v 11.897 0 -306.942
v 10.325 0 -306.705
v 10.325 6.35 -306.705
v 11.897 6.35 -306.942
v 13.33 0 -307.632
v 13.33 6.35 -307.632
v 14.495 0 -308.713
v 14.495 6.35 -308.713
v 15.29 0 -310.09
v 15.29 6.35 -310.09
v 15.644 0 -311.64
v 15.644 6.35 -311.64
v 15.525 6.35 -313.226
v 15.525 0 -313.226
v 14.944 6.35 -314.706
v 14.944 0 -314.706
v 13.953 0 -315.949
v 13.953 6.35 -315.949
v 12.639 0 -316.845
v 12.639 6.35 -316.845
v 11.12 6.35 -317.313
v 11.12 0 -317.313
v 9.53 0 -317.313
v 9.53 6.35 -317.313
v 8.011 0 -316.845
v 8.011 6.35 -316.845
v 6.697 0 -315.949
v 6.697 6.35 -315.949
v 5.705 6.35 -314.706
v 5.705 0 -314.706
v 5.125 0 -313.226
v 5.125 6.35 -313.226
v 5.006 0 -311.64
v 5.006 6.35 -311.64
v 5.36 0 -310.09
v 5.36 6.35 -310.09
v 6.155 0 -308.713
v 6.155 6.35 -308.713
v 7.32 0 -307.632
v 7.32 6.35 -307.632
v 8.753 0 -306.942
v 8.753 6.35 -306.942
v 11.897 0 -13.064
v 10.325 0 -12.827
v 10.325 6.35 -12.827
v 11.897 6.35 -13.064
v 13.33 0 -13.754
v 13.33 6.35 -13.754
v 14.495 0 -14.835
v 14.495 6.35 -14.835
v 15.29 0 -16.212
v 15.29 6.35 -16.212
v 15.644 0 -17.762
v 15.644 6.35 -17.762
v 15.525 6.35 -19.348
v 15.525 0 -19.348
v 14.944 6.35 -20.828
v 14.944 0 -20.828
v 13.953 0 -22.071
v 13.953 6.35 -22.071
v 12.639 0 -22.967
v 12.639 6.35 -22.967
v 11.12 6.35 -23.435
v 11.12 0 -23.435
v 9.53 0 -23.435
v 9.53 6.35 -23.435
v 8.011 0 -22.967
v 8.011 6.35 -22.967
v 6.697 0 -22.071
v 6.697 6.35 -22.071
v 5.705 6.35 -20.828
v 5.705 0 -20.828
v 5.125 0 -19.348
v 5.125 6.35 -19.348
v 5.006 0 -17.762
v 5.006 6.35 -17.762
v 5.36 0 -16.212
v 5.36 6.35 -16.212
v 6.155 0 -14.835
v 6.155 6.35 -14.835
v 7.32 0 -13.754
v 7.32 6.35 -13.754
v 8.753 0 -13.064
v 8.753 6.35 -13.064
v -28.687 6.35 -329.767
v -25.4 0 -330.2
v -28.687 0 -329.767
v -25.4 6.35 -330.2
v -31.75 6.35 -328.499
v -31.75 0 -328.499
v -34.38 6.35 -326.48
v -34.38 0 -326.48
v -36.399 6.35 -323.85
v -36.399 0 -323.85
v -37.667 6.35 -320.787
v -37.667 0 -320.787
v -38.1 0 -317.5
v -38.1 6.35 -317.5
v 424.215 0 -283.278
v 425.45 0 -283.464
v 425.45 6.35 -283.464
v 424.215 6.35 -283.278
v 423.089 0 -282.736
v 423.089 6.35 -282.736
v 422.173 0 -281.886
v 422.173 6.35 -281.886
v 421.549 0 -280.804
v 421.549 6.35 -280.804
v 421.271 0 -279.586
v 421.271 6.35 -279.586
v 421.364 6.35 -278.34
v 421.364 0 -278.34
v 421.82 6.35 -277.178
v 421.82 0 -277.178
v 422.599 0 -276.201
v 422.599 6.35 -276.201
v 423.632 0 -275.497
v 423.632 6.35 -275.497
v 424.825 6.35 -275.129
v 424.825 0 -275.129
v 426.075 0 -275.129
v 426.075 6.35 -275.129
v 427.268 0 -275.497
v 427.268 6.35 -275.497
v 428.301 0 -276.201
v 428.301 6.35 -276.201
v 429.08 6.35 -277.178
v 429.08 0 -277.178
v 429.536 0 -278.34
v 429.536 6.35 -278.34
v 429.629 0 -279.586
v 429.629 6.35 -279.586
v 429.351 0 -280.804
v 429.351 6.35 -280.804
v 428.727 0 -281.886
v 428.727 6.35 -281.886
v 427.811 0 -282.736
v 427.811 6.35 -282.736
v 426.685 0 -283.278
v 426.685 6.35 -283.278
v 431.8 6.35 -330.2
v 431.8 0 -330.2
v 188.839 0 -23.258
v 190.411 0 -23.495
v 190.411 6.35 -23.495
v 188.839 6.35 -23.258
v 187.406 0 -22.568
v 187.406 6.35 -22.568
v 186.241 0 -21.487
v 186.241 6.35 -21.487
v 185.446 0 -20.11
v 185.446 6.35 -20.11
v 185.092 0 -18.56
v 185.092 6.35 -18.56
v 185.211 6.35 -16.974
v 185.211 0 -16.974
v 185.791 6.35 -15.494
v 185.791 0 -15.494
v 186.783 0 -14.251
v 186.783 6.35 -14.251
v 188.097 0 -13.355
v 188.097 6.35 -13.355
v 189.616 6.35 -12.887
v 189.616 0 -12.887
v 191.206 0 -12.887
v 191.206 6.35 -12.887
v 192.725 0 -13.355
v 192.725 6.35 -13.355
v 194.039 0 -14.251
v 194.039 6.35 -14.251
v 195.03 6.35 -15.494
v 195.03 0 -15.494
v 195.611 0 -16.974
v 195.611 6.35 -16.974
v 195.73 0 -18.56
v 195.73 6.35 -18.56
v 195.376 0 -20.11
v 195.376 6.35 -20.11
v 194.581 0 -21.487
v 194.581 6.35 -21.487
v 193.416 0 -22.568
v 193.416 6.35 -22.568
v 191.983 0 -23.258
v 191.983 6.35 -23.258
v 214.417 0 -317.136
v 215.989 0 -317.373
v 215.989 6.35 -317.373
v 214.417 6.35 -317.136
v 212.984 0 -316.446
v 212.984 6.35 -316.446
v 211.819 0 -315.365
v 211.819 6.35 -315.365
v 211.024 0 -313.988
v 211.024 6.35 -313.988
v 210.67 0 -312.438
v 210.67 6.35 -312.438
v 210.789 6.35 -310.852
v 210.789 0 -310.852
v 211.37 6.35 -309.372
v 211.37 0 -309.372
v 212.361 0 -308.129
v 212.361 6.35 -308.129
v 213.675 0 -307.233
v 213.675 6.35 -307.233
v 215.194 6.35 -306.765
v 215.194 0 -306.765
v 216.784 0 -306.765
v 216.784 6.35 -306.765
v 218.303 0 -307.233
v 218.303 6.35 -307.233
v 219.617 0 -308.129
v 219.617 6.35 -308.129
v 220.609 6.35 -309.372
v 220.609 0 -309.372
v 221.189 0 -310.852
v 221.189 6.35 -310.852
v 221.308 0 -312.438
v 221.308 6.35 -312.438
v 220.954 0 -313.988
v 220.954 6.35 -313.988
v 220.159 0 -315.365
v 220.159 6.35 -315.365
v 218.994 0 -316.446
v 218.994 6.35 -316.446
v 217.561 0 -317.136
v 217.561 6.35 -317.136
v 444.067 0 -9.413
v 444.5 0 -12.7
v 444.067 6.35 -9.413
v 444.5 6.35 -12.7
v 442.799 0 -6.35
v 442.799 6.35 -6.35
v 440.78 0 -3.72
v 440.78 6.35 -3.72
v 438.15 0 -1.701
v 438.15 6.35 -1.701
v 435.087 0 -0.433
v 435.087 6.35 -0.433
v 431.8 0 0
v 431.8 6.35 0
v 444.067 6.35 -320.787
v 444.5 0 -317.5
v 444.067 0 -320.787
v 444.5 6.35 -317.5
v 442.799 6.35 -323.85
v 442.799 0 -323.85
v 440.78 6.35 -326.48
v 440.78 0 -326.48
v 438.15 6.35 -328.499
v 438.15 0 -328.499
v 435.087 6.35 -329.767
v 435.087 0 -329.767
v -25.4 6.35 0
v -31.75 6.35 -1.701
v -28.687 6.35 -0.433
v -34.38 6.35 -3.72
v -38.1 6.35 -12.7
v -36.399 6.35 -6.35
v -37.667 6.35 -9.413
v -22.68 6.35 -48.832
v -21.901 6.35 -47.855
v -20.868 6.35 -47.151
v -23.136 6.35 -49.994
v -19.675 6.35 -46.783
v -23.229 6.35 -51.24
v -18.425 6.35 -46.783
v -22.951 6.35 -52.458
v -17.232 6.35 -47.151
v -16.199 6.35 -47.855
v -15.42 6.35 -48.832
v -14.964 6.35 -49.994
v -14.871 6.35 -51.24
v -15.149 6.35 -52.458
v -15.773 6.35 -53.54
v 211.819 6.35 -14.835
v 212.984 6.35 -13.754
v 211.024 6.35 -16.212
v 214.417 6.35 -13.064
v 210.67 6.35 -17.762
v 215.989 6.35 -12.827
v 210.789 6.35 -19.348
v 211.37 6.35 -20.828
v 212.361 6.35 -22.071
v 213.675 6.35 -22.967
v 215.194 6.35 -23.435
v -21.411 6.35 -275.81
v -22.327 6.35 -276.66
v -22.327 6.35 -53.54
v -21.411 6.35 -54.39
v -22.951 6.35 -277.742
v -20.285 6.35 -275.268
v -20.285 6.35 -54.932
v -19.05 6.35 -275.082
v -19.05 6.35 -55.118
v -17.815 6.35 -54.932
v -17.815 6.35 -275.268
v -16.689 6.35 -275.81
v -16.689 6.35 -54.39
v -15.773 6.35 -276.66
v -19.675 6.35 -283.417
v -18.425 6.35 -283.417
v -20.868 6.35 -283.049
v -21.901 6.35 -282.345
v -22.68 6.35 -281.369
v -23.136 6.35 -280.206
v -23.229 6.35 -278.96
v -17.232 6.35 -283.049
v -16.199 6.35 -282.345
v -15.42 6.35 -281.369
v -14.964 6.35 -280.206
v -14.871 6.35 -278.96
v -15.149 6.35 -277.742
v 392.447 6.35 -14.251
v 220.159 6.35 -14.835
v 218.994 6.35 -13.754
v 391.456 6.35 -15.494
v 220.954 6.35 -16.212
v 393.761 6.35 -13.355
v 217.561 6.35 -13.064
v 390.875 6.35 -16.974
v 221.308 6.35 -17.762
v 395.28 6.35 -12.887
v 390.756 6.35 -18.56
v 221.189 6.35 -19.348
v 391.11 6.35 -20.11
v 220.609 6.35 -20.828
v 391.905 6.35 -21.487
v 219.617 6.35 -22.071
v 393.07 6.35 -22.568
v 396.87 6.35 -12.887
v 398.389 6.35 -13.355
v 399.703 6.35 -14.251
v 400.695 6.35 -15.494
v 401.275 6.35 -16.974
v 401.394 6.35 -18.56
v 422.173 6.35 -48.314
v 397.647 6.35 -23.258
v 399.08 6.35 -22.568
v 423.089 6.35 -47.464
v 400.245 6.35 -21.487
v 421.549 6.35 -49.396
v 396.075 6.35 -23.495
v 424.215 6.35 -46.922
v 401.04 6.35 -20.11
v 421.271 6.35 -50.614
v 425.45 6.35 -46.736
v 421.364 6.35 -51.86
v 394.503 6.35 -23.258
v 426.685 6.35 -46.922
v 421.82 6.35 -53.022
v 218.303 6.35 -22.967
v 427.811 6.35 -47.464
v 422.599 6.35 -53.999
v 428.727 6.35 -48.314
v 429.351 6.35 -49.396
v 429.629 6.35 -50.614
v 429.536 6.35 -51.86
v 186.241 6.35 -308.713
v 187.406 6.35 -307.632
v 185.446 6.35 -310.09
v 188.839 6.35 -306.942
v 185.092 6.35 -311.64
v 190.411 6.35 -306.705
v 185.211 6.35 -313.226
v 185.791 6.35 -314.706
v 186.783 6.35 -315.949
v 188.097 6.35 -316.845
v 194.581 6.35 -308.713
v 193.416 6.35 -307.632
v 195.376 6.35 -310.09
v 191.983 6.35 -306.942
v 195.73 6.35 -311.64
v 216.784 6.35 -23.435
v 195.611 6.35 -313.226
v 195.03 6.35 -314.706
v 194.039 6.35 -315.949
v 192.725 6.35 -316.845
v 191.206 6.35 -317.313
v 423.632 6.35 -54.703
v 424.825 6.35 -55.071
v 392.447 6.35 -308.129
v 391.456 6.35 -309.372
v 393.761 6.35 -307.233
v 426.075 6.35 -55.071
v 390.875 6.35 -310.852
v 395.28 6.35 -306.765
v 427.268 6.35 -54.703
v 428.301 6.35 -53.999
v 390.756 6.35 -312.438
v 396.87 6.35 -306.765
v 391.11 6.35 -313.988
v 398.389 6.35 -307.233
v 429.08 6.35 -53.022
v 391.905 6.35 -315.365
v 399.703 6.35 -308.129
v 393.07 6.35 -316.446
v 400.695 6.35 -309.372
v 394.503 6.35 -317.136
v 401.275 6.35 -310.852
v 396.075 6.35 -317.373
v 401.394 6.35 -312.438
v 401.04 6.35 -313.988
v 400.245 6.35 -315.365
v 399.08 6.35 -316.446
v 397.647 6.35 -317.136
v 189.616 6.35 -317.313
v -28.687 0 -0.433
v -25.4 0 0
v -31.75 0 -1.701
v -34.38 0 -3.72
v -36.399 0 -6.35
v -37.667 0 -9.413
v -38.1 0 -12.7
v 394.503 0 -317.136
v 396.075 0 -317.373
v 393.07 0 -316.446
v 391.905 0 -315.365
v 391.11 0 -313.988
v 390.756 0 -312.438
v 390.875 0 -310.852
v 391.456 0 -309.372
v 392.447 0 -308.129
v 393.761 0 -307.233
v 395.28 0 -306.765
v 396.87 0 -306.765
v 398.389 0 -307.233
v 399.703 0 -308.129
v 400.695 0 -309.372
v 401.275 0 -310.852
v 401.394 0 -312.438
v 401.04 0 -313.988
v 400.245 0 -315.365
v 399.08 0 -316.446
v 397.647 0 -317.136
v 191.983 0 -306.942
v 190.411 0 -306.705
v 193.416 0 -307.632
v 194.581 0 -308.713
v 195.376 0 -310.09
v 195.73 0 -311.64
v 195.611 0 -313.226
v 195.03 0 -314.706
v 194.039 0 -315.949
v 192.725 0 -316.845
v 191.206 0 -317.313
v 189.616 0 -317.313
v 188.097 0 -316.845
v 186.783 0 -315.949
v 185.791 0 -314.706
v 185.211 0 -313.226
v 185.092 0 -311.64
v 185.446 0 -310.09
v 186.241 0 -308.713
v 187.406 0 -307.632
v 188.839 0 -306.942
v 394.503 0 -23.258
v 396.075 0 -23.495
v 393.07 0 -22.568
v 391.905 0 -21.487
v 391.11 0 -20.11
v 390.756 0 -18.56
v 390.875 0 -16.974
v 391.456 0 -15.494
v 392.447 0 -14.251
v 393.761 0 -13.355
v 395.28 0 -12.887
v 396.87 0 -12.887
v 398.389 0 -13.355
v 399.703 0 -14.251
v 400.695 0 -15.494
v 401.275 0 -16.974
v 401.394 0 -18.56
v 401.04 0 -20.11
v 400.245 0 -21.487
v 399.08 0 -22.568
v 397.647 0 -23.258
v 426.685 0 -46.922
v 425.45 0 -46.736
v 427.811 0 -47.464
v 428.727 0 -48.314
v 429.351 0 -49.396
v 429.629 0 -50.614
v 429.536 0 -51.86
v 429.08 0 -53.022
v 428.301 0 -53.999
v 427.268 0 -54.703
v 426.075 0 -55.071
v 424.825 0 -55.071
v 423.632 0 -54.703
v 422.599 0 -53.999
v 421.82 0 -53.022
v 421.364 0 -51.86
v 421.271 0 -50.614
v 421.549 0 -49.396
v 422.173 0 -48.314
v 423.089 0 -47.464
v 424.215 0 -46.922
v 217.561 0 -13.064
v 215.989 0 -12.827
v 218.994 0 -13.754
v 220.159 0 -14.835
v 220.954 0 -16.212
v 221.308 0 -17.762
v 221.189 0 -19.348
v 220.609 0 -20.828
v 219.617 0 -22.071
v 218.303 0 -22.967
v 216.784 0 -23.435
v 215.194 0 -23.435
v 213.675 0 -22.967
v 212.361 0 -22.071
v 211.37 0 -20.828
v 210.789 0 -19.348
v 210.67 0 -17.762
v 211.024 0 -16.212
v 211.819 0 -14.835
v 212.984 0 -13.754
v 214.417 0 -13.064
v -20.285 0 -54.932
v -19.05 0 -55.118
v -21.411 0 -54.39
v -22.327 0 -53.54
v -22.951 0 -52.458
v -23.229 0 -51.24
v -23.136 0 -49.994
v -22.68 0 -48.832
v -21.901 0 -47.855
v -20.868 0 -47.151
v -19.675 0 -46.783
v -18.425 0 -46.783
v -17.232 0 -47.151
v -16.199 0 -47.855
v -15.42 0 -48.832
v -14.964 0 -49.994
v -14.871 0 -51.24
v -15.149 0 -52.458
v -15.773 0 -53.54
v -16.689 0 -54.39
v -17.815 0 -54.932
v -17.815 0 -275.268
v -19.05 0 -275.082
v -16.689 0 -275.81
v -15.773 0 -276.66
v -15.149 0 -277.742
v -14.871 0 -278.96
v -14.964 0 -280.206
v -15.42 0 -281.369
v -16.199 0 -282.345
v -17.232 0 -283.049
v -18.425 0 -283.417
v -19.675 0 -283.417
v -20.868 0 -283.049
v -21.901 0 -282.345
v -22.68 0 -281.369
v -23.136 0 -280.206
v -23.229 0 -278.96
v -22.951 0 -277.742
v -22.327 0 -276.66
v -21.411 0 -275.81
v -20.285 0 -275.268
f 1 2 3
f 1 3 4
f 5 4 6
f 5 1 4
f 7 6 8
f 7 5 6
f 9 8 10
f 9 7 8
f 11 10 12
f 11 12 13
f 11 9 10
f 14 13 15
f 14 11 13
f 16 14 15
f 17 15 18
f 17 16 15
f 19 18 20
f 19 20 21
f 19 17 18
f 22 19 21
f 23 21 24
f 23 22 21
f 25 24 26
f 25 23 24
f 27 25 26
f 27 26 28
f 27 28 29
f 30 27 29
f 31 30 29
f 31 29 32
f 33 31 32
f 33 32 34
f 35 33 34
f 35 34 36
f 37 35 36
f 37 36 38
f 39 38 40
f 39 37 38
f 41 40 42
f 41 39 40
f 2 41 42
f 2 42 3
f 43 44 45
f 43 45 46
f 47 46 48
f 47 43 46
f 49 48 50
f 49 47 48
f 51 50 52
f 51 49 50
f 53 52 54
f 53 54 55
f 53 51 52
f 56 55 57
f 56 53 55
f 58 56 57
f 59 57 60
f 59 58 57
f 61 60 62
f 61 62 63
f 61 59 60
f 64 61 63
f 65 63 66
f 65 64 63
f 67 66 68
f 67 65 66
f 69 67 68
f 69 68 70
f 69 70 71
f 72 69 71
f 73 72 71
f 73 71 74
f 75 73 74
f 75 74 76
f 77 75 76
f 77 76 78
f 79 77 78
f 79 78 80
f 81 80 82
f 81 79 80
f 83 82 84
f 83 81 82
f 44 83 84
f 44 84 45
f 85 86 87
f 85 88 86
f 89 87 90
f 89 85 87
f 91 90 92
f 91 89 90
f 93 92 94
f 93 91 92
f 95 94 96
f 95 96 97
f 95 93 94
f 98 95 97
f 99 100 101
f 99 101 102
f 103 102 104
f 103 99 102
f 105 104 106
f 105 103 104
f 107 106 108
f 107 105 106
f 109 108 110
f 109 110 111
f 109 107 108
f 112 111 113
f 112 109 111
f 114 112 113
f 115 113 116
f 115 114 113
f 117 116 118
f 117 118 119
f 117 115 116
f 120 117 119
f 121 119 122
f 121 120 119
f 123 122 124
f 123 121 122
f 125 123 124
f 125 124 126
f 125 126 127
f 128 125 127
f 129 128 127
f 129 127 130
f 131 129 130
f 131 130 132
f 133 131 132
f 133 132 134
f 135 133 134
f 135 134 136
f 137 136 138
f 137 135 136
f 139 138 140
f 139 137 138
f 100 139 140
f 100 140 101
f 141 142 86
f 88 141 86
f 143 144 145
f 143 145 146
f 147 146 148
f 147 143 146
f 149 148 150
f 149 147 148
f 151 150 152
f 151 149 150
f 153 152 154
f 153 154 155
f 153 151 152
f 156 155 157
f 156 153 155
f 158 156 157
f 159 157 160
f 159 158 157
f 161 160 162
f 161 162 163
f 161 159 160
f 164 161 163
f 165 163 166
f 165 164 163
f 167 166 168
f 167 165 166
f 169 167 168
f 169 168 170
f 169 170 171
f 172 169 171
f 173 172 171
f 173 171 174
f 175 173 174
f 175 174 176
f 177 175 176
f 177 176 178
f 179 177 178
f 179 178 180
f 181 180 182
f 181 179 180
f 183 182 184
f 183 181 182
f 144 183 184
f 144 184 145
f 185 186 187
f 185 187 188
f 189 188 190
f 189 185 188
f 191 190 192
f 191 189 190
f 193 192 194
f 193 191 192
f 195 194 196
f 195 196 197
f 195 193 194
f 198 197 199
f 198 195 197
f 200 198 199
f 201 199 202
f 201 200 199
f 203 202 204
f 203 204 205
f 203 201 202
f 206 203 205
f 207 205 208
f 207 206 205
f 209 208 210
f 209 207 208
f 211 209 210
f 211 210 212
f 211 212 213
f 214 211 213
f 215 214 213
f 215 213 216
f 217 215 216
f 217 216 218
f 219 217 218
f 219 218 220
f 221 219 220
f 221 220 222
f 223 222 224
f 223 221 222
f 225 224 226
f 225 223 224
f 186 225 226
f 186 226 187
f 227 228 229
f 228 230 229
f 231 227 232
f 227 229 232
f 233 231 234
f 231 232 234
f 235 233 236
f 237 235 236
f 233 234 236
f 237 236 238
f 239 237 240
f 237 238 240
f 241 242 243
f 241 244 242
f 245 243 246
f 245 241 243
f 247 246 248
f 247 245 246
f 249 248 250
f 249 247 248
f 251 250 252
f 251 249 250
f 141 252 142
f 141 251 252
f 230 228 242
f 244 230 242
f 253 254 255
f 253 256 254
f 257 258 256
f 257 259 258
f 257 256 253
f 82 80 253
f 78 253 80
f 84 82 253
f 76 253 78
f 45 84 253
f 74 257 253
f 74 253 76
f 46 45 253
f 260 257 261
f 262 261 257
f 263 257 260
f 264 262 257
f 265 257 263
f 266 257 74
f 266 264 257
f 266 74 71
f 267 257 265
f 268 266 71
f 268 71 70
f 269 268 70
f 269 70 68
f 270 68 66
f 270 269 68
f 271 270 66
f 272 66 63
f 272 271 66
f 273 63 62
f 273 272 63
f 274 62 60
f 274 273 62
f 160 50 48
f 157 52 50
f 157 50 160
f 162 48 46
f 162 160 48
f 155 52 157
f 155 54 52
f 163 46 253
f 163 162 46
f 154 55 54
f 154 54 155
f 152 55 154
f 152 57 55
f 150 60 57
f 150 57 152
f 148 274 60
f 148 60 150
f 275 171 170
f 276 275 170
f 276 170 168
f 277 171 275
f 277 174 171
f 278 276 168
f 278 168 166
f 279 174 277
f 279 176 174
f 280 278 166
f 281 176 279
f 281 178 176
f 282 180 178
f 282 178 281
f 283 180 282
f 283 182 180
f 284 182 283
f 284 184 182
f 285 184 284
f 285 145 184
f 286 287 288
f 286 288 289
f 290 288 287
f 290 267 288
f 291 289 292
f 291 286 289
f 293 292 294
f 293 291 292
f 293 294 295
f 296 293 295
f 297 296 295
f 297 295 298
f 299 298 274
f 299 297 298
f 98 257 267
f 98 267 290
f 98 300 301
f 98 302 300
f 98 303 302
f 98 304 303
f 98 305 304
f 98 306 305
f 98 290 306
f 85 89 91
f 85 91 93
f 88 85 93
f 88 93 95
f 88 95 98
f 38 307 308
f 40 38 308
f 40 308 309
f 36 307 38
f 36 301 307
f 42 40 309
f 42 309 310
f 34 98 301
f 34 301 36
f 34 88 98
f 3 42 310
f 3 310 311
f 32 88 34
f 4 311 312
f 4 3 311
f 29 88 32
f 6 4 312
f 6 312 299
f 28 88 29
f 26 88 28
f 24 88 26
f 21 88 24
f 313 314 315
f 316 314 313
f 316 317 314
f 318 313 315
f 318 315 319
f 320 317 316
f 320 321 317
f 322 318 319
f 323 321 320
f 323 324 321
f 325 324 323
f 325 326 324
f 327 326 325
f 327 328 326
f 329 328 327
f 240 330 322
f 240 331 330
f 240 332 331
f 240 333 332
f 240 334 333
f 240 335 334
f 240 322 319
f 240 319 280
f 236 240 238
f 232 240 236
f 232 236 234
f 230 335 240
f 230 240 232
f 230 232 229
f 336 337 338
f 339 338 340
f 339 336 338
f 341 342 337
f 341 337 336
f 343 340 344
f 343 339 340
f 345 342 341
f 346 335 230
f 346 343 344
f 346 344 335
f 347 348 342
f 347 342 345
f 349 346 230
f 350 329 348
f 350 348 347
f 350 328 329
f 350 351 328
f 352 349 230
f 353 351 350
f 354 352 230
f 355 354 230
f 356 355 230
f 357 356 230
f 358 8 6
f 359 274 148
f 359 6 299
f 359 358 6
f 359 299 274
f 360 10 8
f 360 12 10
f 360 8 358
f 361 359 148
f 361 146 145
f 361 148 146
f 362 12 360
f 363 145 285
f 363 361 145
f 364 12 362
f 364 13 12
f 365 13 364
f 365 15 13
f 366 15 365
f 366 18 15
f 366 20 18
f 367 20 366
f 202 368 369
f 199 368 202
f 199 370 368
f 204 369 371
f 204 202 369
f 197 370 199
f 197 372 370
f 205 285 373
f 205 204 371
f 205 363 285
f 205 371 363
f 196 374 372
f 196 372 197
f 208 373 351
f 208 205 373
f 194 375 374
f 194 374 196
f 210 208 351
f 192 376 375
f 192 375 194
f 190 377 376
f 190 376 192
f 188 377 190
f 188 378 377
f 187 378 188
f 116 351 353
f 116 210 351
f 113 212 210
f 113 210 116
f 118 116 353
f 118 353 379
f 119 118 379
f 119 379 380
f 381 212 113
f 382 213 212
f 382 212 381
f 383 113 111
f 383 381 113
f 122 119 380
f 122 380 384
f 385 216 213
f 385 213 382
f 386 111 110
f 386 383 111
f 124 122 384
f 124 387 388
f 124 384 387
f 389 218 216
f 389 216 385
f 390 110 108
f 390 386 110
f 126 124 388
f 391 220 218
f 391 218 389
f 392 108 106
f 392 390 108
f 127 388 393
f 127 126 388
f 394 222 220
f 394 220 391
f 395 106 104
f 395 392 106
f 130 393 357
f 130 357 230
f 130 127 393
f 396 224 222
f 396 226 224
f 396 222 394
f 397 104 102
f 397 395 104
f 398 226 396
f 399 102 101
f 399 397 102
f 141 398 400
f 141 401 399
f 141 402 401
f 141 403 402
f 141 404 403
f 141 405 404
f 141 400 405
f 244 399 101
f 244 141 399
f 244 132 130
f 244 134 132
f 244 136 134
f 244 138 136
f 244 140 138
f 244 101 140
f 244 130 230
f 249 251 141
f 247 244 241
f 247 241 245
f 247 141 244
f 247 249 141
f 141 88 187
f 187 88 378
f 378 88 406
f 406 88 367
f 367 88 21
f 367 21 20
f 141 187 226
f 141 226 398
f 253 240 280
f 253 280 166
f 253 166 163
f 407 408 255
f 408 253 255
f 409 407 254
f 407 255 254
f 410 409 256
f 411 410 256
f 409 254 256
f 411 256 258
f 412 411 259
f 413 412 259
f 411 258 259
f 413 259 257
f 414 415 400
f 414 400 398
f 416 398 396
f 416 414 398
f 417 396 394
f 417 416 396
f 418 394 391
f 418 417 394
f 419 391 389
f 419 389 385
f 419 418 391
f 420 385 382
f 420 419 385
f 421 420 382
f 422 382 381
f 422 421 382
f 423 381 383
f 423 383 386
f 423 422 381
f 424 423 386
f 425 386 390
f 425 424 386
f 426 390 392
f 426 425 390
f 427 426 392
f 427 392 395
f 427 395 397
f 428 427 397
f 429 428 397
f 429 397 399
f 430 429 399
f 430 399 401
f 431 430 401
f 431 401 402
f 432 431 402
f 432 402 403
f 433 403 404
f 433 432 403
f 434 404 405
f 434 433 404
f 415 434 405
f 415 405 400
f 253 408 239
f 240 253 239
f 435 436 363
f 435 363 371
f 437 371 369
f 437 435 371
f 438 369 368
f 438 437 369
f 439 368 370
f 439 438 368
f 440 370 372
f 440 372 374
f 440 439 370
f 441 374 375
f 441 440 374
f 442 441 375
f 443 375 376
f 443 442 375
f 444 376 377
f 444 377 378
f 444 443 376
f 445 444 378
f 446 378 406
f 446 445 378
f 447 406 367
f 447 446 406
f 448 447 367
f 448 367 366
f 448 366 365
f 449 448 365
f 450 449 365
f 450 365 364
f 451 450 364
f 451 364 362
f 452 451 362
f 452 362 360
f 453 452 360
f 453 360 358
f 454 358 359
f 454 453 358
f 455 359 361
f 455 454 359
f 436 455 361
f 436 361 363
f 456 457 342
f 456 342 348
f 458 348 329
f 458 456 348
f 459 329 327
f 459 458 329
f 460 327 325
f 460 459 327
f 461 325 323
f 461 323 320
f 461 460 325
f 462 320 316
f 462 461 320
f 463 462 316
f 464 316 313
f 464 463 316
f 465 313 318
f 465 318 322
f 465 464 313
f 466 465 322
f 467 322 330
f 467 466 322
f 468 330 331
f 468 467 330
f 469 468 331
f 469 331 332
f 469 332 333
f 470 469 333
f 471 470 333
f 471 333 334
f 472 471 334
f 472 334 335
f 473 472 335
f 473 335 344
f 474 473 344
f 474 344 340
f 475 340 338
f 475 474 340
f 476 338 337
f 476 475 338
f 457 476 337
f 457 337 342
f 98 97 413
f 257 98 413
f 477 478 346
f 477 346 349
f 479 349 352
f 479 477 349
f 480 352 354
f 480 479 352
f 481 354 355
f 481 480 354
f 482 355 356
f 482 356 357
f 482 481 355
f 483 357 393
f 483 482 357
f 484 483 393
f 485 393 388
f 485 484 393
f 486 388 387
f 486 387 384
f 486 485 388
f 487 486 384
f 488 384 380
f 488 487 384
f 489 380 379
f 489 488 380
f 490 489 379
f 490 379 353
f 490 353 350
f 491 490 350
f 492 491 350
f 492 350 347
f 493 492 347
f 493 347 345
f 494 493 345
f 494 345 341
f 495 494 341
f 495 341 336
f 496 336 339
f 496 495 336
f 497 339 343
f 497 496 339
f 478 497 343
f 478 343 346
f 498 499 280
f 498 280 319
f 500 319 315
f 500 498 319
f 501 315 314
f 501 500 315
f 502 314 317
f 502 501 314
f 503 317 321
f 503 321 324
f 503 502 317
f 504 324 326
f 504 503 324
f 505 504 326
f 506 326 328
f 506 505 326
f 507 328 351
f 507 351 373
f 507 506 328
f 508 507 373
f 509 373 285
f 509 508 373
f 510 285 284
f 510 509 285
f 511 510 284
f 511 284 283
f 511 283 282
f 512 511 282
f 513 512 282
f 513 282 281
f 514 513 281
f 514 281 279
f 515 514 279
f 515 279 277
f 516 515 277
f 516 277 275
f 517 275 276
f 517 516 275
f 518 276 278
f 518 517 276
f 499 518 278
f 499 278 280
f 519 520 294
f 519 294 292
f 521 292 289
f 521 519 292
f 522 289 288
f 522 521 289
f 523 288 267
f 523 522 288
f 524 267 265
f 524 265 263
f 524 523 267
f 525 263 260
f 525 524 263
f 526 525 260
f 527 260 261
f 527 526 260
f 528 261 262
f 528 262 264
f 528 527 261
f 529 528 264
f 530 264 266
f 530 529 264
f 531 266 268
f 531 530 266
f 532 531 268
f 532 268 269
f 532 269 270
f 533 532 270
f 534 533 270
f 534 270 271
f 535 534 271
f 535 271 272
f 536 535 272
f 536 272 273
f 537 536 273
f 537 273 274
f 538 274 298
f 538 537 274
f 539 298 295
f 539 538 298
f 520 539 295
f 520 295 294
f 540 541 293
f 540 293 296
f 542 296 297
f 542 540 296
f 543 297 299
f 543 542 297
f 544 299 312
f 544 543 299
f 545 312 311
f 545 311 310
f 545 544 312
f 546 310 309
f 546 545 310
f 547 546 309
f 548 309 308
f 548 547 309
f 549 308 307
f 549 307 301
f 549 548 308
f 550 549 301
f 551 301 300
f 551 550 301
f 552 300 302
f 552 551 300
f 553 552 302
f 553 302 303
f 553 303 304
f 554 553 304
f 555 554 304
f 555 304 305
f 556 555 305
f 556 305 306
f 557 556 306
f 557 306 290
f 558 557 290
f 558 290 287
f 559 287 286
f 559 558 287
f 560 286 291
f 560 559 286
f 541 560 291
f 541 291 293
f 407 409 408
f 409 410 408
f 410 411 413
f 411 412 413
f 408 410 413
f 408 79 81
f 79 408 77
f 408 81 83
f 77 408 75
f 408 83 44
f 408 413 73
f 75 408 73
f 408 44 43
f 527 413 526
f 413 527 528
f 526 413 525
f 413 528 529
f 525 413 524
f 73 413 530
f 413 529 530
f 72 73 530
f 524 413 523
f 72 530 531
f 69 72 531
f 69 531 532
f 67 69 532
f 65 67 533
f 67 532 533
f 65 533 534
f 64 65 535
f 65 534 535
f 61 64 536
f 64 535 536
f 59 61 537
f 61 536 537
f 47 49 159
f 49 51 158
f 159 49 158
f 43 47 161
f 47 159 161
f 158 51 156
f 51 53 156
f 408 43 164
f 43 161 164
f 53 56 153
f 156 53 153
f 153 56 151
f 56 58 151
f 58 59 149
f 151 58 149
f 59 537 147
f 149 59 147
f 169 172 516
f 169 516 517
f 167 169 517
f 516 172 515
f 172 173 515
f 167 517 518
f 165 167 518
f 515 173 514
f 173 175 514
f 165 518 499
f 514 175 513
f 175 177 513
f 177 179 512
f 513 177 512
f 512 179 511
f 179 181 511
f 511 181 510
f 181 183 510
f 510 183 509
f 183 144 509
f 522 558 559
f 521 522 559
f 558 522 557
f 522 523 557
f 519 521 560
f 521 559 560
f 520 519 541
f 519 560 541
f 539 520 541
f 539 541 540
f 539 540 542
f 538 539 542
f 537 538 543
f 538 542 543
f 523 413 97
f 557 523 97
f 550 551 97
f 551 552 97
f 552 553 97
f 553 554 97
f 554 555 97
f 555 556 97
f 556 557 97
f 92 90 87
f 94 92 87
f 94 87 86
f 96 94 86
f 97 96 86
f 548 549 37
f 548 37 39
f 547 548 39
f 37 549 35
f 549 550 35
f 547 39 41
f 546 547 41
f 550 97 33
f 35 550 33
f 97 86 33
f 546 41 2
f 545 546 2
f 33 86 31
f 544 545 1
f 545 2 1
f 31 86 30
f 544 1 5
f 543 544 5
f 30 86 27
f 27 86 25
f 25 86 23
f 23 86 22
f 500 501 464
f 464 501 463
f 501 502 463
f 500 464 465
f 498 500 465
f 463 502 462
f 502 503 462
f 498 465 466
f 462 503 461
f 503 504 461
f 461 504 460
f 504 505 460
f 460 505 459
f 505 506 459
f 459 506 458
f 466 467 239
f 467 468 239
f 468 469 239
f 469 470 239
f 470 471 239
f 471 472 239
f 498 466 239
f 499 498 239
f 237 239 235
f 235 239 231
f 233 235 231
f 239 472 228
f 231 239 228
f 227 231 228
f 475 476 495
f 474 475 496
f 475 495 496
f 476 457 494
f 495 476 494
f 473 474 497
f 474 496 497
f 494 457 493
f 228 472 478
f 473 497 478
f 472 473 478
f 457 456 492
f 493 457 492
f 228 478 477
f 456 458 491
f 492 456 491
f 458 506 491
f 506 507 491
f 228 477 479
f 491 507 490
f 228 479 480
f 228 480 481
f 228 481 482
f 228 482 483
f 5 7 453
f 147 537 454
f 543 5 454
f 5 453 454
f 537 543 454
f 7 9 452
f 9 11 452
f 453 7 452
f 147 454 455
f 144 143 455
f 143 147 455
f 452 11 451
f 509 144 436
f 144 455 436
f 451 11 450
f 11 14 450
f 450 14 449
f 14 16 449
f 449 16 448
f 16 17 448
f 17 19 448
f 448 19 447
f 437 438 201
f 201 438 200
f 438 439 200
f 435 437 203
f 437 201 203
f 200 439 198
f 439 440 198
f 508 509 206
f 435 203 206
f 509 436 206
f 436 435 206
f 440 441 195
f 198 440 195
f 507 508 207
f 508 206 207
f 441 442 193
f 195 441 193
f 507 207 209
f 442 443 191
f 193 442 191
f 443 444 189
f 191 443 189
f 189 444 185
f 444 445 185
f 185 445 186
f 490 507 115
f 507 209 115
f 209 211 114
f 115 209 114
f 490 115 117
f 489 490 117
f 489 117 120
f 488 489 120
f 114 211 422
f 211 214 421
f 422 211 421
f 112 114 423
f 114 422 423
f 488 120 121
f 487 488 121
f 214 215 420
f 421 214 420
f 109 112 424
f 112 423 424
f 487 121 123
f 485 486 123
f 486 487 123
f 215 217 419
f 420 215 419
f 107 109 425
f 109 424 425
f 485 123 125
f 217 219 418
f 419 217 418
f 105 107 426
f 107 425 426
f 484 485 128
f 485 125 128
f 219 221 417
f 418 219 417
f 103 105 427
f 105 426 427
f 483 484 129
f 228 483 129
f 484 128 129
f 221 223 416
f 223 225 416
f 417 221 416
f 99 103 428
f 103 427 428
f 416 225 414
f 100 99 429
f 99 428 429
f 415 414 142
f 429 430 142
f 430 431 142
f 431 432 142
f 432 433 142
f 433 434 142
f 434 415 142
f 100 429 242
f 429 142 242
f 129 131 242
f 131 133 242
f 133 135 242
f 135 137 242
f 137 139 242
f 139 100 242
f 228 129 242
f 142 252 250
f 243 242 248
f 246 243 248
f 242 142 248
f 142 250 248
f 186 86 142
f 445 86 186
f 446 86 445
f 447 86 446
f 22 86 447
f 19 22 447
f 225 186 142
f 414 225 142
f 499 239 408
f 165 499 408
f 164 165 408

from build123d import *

# Parameters (mm, degrees)
SKETCH1_R           = 5.334
SKETCH1_R_2         = 4.191
BOSS_EXTRUDE1_DEPTH = 6.35
FILLET1_R           = 12.7


with BuildPart() as part:
    # Sketch1 → Boss-Extrude1 (new body)
    with BuildSketch(Plane(origin=(0, 0, 0), x_dir=(1, 0, 0), z_dir=(0, 1, 0))):
        Polygon((0, 0), (406.4, 0), (444.5, 0), (444.5, 330.2), (406.4, 330.2), (0, 330.2), (-38.1, 330.2), (-38.1, 0), align=None)
        with Locations(Location((10.324858278, 312.039, 0), (0, 0, 270))):
            Circle(SKETCH1_R, mode=Mode.SUBTRACT)
        with Locations(Location((10.324858278, 18.161, 0), (0, 0, 270))):
            Circle(SKETCH1_R, mode=Mode.SUBTRACT)
        with Locations(Location((190.410858278, 312.039, 0), (0, 0, 270))):
            Circle(SKETCH1_R, mode=Mode.SUBTRACT)
        with Locations(Location((190.410858278, 18.161, 0), (0, 0, 90))):
            Circle(SKETCH1_R, mode=Mode.SUBTRACT)
        with Locations(Location((215.989141722, 18.161, 0), (0, 0, 270))):
            Circle(SKETCH1_R, mode=Mode.SUBTRACT)
        with Locations(Location((396.075141722, 18.161, 0), (0, 0, 90))):
            Circle(SKETCH1_R, mode=Mode.SUBTRACT)
        with Locations(Location((215.989141722, 312.039, 0), (0, 0, 90))):
            Circle(SKETCH1_R, mode=Mode.SUBTRACT)
        with Locations(Location((396.075141722, 312.039, 0), (0, 0, 90))):
            Circle(SKETCH1_R, mode=Mode.SUBTRACT)
        with Locations(Location((-19.05, 279.273, 0), (0, 0, 270))):
            Circle(SKETCH1_R_2, mode=Mode.SUBTRACT)
        with Locations(Location((-19.05, 50.927, 0), (0, 0, 90))):
            Circle(SKETCH1_R_2, mode=Mode.SUBTRACT)
        with Locations(Location((425.45, 50.927, 0), (0, 0, 270))):
            Circle(SKETCH1_R_2, mode=Mode.SUBTRACT)
        with Locations(Location((425.45, 279.273, 0), (0, 0, 90))):
            Circle(SKETCH1_R_2, mode=Mode.SUBTRACT)
    extrude(amount=BOSS_EXTRUDE1_DEPTH)

    # Fillet1
    fillet1_edges = [part.edges().sort_by_distance(p)[0] for p in [
        (-38.1, 3.175, 0),
        (-38.1, 3.175, -330.2),
        (444.5, 3.175, -330.2),
        (444.5, 3.175, 0),
    ]]
    fillet(fillet1_edges, radius=FILLET1_R)


solid = part.part
